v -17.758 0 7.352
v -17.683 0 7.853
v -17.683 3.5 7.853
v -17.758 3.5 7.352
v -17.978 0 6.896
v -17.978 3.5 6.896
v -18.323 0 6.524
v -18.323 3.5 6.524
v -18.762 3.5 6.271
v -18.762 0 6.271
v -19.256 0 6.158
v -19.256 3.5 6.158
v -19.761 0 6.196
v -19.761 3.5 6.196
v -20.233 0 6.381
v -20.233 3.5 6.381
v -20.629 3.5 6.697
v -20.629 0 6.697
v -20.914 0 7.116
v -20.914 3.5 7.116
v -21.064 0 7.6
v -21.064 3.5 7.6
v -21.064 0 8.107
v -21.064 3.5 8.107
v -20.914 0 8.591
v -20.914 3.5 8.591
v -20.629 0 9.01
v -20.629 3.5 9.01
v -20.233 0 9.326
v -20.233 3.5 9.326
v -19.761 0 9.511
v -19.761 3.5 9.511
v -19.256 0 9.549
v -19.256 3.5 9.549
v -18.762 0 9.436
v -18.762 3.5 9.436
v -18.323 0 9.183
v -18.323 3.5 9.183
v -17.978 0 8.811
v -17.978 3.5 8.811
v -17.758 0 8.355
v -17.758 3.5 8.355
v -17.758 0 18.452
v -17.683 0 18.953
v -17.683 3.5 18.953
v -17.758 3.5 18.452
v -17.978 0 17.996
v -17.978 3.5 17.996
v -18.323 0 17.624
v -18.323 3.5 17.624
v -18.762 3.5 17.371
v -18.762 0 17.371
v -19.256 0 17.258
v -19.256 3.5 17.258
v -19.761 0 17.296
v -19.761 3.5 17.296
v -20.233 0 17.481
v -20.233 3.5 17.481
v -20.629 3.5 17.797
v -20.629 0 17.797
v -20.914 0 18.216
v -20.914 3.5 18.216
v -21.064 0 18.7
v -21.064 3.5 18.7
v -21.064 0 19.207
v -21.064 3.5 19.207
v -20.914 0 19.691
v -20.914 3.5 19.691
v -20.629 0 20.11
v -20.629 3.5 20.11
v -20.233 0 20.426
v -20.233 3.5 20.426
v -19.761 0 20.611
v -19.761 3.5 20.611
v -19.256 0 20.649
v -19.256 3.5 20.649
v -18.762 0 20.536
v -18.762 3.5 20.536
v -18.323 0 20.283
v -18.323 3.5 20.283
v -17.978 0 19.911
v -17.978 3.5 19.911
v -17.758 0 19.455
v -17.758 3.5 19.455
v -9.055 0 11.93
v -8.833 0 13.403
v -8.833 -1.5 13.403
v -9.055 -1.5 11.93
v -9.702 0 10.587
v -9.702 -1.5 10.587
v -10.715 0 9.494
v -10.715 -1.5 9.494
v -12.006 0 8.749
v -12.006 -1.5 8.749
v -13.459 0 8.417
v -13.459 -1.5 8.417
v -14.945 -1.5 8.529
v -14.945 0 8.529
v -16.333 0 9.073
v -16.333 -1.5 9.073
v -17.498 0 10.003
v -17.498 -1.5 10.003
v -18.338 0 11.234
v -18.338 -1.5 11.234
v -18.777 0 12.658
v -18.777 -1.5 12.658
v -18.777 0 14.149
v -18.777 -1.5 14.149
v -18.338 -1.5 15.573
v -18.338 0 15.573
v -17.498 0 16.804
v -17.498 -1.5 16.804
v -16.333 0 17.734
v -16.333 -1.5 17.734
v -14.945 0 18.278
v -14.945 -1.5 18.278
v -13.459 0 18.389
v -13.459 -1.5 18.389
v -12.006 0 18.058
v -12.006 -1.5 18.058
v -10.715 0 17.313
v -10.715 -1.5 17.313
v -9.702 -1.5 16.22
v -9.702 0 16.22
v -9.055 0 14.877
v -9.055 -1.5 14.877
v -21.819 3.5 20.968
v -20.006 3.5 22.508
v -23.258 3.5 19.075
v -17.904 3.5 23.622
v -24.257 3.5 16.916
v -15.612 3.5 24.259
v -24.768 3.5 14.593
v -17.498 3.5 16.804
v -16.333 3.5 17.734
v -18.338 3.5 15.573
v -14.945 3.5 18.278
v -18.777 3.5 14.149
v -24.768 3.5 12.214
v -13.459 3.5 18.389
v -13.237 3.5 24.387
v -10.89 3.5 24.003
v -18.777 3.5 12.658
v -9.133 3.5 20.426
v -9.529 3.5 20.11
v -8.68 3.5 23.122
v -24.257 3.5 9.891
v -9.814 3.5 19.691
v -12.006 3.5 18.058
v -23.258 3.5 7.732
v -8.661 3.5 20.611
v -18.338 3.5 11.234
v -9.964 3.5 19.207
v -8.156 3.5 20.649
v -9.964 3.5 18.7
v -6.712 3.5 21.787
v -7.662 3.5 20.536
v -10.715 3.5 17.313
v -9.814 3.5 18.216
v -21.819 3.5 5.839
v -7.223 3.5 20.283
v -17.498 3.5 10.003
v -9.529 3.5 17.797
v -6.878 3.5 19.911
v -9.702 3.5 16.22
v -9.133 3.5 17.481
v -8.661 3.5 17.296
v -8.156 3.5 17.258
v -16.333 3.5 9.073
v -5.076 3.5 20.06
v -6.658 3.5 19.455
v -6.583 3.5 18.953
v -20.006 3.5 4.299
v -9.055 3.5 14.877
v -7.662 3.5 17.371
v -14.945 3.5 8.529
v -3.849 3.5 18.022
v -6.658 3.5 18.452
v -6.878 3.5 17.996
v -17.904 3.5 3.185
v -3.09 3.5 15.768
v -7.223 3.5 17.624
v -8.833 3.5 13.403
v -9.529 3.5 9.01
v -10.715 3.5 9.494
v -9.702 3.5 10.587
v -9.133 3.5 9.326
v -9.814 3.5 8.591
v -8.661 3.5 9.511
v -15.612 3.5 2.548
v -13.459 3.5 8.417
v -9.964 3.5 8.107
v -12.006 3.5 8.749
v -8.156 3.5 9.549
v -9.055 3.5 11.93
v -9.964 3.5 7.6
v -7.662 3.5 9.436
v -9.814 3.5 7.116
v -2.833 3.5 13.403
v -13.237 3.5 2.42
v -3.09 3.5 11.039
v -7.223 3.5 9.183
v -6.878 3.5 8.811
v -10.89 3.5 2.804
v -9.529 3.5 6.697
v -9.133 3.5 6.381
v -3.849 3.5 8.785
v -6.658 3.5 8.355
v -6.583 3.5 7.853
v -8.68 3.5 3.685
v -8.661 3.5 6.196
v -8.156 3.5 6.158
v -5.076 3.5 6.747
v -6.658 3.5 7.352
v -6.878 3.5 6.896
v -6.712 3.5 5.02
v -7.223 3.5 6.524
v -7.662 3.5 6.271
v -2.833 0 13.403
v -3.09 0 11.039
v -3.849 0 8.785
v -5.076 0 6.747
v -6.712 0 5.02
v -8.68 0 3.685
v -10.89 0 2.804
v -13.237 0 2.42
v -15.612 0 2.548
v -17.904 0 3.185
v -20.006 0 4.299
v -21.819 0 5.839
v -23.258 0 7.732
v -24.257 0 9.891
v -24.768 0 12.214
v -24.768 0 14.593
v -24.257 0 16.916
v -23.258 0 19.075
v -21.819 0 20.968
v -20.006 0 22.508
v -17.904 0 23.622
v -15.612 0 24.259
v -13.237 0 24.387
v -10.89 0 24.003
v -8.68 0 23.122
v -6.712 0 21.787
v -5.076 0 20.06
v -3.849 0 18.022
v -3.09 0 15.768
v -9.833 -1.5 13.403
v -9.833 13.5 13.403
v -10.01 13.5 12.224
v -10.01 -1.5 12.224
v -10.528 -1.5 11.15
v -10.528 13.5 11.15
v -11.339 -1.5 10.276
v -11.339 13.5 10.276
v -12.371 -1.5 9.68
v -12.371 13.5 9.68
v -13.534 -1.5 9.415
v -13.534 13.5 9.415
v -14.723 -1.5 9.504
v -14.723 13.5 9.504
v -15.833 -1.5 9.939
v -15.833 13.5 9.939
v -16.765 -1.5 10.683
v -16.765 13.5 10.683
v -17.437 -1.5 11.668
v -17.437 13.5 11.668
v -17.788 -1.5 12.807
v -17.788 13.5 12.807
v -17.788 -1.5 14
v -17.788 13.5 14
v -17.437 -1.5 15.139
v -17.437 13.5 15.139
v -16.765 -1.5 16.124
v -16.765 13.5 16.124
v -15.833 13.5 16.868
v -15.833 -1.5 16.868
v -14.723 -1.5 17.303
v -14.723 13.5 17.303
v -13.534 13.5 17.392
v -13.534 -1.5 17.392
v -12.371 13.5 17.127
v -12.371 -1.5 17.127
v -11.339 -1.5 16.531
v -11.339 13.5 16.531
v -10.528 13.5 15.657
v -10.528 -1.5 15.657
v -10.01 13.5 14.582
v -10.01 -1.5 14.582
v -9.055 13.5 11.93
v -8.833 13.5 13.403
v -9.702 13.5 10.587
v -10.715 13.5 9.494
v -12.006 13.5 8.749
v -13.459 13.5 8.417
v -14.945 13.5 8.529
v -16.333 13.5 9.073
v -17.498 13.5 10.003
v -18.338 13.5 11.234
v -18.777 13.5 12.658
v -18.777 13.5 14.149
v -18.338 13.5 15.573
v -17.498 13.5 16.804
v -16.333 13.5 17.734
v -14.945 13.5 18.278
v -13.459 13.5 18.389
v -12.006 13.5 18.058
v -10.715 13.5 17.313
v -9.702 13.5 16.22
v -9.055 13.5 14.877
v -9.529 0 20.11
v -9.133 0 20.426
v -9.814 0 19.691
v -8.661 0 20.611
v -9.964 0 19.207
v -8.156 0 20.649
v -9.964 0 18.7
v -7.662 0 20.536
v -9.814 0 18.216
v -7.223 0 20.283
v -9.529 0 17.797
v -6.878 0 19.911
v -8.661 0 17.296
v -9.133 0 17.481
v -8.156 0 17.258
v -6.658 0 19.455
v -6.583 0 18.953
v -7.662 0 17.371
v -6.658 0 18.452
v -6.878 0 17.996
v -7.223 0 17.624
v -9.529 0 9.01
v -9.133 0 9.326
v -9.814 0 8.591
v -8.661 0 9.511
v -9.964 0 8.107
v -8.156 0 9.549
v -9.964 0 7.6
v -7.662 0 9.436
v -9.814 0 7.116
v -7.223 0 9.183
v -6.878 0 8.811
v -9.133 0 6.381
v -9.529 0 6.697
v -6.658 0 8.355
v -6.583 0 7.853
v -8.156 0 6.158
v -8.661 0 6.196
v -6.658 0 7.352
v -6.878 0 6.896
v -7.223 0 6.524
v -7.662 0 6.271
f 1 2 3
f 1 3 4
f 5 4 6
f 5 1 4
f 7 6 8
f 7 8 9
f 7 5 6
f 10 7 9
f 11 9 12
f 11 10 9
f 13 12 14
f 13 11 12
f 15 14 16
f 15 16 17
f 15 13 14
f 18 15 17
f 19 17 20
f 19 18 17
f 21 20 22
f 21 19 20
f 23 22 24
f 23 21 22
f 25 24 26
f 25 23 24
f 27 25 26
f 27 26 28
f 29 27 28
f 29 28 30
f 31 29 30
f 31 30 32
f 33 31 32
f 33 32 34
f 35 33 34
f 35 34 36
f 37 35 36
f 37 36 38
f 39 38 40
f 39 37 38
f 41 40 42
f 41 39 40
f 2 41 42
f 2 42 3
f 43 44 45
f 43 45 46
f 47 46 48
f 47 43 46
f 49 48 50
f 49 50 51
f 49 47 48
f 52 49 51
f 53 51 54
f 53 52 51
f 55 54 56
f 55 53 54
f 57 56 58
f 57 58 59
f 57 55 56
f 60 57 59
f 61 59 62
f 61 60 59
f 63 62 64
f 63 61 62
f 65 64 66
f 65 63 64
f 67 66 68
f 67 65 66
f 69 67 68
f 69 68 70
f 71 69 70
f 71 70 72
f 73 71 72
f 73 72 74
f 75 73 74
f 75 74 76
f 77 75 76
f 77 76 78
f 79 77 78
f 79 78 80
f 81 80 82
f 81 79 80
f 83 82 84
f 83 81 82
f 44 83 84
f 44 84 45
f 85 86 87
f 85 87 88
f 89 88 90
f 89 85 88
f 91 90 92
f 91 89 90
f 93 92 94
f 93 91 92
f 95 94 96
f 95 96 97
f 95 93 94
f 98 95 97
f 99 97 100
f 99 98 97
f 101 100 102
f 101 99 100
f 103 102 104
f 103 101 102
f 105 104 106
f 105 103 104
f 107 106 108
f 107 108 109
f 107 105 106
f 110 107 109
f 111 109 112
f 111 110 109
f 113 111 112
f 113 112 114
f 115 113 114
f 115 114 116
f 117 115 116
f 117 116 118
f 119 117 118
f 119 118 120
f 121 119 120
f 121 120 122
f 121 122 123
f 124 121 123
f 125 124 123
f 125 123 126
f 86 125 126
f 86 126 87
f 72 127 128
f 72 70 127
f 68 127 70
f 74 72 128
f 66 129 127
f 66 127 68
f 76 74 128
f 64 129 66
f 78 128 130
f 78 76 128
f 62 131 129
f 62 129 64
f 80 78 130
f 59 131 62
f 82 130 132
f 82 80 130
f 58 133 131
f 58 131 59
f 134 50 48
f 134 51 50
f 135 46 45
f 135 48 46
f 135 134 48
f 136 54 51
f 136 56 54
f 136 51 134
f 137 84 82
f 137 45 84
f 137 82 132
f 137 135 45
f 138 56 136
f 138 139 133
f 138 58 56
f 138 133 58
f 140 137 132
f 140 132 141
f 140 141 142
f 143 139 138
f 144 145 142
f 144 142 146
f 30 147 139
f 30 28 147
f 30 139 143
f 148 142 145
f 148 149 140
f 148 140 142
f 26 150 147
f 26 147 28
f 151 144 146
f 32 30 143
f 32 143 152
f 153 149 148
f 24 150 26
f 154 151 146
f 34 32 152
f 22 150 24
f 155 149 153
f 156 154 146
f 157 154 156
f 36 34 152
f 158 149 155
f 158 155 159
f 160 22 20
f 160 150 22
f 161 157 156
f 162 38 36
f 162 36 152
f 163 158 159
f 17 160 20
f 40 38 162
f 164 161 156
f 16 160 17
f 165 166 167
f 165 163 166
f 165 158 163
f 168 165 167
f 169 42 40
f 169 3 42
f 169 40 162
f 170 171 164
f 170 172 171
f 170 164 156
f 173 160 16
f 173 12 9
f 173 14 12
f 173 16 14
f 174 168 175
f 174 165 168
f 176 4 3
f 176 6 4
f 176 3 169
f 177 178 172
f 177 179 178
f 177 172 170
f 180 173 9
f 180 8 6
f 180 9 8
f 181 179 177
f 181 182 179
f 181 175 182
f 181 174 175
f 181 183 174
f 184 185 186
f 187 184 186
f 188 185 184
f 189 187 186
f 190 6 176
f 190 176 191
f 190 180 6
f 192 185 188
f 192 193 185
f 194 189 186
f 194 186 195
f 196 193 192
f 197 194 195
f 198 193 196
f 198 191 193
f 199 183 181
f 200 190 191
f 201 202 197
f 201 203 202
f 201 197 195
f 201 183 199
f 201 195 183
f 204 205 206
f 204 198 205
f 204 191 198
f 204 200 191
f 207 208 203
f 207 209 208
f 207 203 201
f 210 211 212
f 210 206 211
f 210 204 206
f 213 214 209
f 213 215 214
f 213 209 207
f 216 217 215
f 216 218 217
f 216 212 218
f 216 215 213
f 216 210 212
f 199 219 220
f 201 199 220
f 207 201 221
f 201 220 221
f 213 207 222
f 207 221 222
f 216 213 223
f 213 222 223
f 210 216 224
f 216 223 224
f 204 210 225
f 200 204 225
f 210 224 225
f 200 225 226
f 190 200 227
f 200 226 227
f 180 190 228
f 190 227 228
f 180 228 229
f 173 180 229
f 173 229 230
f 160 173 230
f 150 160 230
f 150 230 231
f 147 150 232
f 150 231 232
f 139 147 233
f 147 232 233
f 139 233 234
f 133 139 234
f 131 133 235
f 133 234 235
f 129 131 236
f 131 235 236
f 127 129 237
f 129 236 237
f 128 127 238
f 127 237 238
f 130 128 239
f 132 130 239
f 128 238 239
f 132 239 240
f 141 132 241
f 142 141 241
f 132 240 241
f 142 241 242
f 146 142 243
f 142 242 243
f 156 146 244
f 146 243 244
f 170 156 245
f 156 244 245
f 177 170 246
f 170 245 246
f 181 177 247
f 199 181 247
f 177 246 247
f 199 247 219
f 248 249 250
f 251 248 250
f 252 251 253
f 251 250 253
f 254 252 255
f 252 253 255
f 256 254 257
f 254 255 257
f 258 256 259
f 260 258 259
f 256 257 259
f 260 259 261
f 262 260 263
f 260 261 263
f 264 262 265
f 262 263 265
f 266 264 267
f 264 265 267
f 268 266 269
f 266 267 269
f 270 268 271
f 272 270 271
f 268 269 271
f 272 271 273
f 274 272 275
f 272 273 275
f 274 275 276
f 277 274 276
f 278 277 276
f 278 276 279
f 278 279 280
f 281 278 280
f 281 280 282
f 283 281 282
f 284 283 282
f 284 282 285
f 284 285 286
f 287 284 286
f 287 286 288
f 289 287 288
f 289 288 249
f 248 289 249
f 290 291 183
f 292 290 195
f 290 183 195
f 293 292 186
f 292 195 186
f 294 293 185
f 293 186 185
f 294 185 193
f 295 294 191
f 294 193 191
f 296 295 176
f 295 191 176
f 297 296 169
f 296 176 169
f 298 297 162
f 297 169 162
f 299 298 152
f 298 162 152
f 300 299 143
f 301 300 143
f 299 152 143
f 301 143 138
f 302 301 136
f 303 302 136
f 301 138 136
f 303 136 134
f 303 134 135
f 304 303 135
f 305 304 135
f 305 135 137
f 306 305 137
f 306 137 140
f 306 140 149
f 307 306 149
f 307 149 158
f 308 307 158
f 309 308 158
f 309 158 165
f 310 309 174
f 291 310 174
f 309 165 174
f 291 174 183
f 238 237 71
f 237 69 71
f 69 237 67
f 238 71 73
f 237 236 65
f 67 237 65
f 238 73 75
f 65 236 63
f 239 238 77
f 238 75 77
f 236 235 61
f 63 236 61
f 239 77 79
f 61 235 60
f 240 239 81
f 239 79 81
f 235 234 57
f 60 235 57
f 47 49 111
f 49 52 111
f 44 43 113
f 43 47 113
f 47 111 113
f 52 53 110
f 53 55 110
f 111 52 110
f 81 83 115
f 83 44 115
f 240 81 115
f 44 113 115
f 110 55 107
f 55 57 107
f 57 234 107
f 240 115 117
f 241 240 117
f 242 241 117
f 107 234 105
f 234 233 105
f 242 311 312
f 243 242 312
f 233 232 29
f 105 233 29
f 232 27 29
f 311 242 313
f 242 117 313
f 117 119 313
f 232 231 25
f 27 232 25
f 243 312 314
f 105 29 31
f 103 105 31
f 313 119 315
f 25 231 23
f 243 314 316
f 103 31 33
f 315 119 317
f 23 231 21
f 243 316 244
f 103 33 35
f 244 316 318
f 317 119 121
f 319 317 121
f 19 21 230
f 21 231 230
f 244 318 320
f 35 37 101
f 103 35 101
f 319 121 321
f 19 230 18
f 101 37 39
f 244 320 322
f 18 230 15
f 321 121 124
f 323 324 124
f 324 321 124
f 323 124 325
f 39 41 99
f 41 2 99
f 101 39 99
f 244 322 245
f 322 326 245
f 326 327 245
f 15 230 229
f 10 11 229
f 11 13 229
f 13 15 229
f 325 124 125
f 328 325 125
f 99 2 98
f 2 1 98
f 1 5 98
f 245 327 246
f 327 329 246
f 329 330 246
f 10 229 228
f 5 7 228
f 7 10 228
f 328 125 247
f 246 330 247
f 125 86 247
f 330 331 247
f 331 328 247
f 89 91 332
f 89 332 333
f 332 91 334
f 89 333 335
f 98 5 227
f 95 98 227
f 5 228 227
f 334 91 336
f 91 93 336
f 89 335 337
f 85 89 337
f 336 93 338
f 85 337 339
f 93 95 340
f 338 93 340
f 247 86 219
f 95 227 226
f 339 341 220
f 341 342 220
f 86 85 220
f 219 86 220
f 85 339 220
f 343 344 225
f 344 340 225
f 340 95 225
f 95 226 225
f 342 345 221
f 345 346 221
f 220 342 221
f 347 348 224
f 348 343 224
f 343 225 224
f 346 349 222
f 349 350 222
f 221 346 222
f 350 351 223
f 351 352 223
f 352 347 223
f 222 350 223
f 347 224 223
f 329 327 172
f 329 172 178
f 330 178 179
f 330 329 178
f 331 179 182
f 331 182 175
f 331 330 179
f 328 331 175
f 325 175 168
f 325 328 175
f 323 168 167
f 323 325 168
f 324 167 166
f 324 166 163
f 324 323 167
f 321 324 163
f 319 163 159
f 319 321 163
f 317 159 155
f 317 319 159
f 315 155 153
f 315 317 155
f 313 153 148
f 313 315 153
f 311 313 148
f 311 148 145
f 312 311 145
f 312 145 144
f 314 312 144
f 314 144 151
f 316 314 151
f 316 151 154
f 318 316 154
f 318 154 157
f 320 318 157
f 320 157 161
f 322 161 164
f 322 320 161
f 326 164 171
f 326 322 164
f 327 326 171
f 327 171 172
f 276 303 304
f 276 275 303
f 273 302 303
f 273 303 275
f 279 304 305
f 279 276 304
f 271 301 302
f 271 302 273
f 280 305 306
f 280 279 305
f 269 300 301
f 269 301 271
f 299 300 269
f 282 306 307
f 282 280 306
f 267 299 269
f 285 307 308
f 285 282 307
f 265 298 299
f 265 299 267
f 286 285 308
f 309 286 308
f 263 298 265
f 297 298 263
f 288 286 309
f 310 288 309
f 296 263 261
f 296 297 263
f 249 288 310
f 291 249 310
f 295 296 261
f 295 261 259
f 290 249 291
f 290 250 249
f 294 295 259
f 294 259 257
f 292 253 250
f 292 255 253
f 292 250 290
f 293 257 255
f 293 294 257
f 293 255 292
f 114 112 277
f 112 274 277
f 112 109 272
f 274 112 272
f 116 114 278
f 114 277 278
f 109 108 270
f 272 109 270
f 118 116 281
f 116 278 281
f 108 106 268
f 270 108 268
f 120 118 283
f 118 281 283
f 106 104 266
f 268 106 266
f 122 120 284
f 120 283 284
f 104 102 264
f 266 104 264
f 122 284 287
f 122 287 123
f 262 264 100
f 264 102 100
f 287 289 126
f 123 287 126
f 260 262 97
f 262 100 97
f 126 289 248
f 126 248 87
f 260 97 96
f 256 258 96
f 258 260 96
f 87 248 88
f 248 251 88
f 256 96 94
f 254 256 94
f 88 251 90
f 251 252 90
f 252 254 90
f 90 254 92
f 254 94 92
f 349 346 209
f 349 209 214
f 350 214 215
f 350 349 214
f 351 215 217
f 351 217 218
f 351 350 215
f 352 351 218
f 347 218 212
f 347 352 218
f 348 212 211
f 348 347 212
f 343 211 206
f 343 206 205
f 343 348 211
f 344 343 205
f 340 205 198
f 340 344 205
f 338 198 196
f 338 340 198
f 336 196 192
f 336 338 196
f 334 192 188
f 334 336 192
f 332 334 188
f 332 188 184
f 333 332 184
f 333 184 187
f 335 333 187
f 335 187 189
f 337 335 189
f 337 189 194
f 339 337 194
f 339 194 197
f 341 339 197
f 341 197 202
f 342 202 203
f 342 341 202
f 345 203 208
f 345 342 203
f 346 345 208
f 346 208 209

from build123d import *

# Parameters (mm, degrees)
SKETCH1_R           = 11
SKETCH1_R_2         = 4
SKETCH1_R_3         = 1.7
BOSS_EXTRUDE1_DEPTH = 3.5
SKETCH2_R           = 5
BOSS_EXTRUDE2_DEPTH = 10
BOSS_EXTRUDE3_START = -5
SKETCH2_2_R         = 5
BOSS_EXTRUDE3_DEPTH = 5
SKETCH3_R           = 4
CUT_EXTRUDE1_DEPTH  = 20


with BuildPart() as part:
    # Sketch1 → Boss-Extrude1 (new body)
    with BuildSketch(Plane(origin=(0, 0, 0), x_dir=(1, 0, 0), z_dir=(0, 1, 0))):
        with Locations((-13.832754598, -13.4034603)):
            Circle(SKETCH1_R)
        with Locations((-13.832754598, -13.4034603)):
            Circle(SKETCH1_R_2, mode=Mode.SUBTRACT)
        with Locations((-19.382754598, -7.8534603)):
            Circle(SKETCH1_R_3, mode=Mode.SUBTRACT)
        with Locations((-8.282754598, -7.8534603)):
            Circle(SKETCH1_R_3, mode=Mode.SUBTRACT)
        with Locations((-8.282754598, -18.9534603)):
            Circle(SKETCH1_R_3, mode=Mode.SUBTRACT)
        with Locations((-19.382754598, -18.9534603)):
            Circle(SKETCH1_R_3, mode=Mode.SUBTRACT)
    extrude(amount=BOSS_EXTRUDE1_DEPTH)

    # Sketch2 → Boss-Extrude2 (add)
    with BuildSketch(Plane(origin=(0, 3.5, 0), x_dir=(1, 0, 0), z_dir=(0, 1, 0))):
        with Locations((-13.832754598, -13.4034603)):
            Circle(SKETCH2_R)
    extrude(amount=BOSS_EXTRUDE2_DEPTH)

    # Sketch2<2> → Boss-Extrude3 (add)
    with BuildSketch(Plane(origin=(0, 3.5, 0), x_dir=(1, 0, 0), z_dir=(0, 1, 0)).offset(BOSS_EXTRUDE3_START)):
        with Locations((-13.832754598, -13.4034603)):
            Circle(SKETCH2_2_R)
    extrude(amount=BOSS_EXTRUDE3_DEPTH)

    # Sketch3 → Cut-Extrude1 (cut)
    with BuildSketch(Plane(origin=(0, 13.5, 0), x_dir=(1, 0, 0), z_dir=(0, 1, 0))):
        with Locations((-13.832754598, -13.4034603)):
            Circle(SKETCH3_R)
    extrude(amount=-CUT_EXTRUDE1_DEPTH, mode=Mode.SUBTRACT)


solid = part.part
